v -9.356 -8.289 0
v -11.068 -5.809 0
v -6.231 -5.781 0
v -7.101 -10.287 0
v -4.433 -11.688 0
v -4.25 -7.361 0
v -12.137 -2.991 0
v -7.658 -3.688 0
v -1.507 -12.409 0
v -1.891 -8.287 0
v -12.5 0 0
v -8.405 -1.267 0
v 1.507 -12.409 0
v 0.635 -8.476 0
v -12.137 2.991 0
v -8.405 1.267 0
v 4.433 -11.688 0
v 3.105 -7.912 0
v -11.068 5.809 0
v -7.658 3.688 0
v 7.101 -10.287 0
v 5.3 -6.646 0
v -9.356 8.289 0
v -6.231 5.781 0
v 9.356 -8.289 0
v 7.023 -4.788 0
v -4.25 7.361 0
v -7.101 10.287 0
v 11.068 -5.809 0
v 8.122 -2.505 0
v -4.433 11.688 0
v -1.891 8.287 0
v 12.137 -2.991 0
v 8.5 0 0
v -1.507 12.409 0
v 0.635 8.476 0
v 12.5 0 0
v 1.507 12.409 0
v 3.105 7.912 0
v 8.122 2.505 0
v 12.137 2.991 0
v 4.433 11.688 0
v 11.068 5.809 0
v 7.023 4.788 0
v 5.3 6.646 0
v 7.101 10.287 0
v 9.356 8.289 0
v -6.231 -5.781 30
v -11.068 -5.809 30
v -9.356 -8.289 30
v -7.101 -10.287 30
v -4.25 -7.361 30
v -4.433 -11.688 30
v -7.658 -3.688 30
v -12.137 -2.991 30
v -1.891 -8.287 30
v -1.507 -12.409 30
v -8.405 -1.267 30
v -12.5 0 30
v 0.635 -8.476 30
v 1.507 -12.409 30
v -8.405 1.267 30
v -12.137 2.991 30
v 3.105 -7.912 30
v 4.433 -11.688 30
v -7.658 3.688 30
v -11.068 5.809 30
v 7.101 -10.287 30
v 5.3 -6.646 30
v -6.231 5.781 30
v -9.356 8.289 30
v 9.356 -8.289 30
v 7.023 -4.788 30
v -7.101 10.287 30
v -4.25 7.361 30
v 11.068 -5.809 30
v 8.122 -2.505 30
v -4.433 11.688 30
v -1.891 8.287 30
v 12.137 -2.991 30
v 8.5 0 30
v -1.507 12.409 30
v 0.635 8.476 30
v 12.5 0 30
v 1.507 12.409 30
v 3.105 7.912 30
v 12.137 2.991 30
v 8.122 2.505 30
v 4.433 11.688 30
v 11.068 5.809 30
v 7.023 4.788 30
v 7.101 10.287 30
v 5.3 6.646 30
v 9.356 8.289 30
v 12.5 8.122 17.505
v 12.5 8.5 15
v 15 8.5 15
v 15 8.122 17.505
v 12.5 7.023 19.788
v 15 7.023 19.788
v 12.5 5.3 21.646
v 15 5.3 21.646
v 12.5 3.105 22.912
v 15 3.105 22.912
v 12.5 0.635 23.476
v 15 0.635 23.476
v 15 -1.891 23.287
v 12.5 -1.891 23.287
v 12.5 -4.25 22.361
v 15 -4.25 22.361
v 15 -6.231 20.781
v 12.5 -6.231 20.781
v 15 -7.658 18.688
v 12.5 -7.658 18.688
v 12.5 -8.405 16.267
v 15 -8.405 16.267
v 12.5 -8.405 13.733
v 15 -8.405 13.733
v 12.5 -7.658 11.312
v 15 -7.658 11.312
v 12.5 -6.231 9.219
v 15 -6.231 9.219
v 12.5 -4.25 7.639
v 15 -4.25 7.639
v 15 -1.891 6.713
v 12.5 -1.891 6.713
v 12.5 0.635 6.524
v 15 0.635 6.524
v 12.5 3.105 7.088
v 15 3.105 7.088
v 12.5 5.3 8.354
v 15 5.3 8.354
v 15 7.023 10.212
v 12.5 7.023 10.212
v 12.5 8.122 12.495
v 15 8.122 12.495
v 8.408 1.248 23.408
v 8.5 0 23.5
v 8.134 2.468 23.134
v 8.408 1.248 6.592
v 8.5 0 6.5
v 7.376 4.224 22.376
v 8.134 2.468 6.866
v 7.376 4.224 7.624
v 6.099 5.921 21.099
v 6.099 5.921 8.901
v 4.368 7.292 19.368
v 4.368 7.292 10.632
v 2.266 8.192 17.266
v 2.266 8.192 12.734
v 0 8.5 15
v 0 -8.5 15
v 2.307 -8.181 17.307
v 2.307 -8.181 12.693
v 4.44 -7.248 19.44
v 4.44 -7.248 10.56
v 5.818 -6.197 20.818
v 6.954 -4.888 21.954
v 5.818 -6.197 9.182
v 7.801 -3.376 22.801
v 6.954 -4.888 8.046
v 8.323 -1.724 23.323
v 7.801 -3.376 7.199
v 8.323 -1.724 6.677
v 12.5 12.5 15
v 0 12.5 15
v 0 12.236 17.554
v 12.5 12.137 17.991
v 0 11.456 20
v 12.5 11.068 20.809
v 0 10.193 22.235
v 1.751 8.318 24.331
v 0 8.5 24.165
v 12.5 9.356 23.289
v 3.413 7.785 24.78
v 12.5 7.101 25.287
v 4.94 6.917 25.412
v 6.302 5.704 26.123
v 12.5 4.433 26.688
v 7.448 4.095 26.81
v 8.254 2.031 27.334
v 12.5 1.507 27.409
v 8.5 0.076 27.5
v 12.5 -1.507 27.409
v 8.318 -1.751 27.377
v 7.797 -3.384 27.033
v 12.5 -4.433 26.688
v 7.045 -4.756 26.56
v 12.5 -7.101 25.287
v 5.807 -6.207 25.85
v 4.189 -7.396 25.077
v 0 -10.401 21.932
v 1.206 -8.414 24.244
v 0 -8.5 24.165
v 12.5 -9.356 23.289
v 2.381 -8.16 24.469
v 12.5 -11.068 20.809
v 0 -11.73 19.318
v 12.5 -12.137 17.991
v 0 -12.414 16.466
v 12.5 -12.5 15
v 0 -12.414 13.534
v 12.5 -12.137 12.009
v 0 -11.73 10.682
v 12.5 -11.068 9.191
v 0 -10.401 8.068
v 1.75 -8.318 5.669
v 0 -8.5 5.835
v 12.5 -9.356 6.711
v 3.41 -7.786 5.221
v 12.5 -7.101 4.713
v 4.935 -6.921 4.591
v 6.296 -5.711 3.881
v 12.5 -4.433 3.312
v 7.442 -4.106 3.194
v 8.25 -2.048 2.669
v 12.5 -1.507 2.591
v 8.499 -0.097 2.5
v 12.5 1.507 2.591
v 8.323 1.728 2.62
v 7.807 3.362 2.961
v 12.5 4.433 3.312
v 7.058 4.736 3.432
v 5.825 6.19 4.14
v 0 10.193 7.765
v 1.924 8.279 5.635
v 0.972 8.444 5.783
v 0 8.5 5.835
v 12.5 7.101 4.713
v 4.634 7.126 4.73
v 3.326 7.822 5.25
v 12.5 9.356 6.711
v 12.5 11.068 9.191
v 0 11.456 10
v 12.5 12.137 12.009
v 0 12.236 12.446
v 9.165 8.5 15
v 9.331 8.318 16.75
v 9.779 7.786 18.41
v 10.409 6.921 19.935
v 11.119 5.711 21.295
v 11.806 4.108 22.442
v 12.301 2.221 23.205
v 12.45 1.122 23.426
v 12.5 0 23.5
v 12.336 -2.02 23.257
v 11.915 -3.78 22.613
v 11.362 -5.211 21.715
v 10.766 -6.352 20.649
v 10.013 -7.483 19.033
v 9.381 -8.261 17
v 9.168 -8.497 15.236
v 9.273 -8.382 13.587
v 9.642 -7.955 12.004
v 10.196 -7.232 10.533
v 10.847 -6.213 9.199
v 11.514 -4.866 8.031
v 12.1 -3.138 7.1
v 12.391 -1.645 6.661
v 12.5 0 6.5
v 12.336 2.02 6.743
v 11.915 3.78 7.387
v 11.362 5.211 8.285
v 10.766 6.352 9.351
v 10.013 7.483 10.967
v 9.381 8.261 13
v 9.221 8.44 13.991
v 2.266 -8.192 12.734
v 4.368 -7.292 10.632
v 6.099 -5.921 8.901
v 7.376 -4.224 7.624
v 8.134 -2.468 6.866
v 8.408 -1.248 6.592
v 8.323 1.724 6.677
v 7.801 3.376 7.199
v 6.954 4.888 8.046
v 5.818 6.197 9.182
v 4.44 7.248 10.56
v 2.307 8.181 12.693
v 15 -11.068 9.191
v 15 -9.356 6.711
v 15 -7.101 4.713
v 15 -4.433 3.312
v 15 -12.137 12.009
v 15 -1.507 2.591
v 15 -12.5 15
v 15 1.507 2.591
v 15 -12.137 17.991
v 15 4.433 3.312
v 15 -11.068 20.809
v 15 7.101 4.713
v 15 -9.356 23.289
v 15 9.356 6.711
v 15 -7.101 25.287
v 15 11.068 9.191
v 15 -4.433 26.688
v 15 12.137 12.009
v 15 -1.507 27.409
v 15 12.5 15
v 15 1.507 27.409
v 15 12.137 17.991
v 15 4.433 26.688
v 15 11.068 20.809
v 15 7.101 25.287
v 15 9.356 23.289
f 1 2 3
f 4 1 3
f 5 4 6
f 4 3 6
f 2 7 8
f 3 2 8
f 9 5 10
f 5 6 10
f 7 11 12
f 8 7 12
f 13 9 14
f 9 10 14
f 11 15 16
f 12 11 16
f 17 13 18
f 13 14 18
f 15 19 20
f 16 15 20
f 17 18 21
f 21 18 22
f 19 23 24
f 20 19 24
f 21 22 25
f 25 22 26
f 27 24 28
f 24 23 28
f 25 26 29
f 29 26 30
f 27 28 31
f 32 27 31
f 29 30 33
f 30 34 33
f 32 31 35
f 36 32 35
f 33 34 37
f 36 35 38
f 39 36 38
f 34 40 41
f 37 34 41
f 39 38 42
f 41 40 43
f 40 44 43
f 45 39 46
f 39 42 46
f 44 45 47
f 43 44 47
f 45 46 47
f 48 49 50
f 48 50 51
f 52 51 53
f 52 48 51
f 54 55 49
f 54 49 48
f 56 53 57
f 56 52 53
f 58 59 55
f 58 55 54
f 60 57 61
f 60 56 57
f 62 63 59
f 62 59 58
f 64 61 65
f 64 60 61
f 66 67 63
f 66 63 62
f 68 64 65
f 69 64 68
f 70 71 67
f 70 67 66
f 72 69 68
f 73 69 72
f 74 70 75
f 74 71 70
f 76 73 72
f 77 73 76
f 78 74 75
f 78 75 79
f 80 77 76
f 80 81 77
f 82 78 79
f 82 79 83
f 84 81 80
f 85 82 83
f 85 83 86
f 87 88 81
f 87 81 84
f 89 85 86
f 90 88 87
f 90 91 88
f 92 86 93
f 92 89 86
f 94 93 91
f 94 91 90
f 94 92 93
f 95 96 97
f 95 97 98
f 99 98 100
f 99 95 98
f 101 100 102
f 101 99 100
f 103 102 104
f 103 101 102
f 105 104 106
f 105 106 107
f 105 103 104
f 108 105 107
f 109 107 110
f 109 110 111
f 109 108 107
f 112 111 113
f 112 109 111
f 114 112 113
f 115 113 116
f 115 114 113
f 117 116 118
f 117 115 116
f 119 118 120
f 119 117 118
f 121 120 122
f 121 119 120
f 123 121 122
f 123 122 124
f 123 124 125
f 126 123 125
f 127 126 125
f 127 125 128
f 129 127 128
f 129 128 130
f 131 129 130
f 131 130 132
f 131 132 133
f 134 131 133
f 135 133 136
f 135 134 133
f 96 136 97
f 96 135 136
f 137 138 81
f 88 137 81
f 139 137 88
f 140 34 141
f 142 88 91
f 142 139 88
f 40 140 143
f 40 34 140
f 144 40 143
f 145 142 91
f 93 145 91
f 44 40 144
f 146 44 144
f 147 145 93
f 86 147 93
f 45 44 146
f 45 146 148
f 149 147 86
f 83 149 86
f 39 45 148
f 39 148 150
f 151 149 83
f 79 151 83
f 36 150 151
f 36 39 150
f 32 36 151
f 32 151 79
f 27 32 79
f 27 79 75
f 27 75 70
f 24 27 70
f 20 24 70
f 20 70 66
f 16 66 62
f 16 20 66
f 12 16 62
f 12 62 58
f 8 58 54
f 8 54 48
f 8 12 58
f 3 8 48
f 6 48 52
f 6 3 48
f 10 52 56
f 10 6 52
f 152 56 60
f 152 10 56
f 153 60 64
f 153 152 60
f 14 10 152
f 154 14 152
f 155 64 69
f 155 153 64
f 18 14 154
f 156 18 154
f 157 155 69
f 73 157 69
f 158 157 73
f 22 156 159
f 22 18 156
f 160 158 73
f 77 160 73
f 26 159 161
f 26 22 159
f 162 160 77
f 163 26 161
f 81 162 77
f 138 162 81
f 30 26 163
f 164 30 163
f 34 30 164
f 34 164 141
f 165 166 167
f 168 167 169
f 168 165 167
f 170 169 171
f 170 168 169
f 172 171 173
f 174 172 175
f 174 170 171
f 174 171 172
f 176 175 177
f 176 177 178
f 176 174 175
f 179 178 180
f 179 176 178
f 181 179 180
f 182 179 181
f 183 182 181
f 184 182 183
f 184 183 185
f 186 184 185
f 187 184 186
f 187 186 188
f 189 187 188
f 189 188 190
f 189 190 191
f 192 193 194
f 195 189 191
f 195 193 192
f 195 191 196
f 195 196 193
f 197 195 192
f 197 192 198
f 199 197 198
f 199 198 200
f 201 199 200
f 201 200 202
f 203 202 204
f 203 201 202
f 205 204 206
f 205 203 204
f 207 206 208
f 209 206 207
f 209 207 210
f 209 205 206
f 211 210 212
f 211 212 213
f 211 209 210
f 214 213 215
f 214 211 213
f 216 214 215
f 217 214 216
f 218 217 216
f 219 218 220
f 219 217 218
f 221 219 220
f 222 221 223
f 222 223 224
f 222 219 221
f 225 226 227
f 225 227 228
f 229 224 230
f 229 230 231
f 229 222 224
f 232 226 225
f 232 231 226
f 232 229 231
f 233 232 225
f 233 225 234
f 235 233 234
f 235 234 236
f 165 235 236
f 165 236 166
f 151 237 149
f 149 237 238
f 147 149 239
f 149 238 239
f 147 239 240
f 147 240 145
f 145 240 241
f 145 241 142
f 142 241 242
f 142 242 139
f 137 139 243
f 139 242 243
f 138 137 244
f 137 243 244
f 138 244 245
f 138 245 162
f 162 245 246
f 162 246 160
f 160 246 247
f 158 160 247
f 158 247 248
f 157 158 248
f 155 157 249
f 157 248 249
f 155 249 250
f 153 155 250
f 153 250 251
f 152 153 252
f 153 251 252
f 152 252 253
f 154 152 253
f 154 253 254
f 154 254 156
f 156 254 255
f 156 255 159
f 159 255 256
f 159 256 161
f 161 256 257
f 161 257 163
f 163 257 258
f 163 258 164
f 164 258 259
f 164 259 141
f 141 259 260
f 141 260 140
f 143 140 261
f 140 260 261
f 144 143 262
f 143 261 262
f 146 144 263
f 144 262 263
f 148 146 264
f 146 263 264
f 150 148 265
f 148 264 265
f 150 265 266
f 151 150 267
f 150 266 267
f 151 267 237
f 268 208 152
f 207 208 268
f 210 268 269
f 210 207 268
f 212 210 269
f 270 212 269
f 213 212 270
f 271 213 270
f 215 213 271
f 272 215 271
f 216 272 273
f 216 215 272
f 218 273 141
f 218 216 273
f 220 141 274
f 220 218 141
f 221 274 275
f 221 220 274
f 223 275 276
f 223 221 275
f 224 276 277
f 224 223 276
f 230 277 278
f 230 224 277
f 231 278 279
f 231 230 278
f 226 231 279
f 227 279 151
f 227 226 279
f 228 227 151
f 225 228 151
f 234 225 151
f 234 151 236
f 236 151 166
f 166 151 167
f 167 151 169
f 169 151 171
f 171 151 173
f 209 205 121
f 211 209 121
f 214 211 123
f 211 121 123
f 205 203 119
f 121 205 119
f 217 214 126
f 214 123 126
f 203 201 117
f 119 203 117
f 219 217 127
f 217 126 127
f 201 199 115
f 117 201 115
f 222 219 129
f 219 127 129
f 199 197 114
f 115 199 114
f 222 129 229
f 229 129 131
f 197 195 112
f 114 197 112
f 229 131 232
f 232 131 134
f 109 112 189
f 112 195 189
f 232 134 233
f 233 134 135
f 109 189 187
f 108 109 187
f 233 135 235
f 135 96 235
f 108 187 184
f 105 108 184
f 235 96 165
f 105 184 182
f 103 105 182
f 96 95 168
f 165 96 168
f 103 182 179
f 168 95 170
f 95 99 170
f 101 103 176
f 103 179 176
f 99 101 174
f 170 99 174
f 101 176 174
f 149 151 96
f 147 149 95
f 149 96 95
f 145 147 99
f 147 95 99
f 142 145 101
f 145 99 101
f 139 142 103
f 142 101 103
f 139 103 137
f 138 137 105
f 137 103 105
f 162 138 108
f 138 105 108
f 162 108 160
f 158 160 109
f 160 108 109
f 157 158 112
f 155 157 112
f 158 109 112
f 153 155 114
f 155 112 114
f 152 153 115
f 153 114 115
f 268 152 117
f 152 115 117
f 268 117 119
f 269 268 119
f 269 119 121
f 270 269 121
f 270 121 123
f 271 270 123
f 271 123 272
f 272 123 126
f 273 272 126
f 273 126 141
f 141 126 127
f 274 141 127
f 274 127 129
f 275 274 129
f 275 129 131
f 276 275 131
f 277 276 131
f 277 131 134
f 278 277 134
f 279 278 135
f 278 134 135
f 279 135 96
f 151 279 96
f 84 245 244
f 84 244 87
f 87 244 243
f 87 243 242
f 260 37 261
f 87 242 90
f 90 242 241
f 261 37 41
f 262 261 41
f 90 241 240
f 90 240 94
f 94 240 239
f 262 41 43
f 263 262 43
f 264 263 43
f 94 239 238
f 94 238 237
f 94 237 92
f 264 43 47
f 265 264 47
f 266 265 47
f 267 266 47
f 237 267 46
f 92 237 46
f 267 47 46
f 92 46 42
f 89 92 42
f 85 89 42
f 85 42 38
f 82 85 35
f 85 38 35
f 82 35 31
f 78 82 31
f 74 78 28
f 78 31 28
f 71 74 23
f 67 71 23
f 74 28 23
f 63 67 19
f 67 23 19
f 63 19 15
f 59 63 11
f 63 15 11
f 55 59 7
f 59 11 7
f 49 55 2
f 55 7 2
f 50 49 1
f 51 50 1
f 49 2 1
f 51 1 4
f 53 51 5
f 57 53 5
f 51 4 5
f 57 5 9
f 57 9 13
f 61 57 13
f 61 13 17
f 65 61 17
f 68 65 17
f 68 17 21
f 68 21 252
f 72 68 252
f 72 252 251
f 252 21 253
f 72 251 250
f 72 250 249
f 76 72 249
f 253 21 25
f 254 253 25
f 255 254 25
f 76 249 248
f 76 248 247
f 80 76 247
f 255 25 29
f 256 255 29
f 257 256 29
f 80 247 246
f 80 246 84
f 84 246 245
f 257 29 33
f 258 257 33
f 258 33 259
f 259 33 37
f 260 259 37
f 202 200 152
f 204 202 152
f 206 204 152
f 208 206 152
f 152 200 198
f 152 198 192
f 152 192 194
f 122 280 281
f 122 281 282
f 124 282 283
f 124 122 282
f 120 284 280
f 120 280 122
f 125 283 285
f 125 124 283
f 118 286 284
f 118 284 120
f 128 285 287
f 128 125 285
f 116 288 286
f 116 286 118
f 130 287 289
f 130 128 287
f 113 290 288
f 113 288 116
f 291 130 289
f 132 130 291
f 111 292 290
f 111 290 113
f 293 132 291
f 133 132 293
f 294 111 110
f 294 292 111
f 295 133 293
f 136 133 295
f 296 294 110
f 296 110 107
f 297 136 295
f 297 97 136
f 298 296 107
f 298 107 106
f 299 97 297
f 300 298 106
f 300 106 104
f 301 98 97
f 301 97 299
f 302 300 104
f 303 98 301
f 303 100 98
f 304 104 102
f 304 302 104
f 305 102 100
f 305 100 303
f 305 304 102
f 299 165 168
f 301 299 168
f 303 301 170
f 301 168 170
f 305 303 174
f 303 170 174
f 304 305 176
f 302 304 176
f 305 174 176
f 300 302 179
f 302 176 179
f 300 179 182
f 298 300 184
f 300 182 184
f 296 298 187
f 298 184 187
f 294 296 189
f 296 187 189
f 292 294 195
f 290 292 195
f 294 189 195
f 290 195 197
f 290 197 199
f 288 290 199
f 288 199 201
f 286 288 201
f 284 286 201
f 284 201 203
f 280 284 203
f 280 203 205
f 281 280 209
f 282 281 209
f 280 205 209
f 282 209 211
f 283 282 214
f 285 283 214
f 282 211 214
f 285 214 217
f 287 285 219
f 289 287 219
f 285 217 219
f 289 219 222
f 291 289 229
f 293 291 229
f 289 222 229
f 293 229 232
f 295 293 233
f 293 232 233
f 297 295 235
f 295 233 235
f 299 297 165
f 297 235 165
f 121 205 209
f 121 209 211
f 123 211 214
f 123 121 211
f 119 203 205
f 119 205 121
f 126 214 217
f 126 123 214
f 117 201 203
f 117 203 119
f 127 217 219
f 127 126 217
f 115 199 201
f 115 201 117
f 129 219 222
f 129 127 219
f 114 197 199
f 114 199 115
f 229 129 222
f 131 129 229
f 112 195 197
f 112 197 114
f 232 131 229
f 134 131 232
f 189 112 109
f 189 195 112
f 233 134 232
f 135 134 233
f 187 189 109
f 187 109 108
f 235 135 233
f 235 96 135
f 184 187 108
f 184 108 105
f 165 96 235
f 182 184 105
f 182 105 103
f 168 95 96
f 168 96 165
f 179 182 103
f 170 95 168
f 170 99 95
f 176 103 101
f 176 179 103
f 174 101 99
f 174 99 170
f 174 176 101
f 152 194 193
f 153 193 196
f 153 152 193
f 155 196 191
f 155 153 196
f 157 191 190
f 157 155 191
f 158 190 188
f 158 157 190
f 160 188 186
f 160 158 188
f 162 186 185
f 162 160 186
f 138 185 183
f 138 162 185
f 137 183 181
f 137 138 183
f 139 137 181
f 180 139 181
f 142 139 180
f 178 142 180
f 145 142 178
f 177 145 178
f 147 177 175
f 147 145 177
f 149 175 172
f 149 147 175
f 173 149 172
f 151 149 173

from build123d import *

# Parameters (mm, degrees)
F0_R     = 12.5
F0_R_2   = 8.5
F1_DEPTH = 30
F4_R     = 12.5
F4_R_2   = 8.5
F5_DEPTH = 12.5
F6_DEPTH = 12.5
F7_DEPTH = 30
F8_DEPTH = 2.5


with BuildPart() as f1:
    # F0 (on Top) → F1 (new body)
    with BuildSketch(Plane.XY):
        Circle(F0_R)
        Circle(F0_R_2, mode=Mode.SUBTRACT)
    extrude(amount=F1_DEPTH)

    # F4 (on face) → F6 (cut)
    with BuildSketch(Plane.YZ.offset(12.5)):
        with Locations((0, 15)):
            Circle(F4_R_2)
    extrude(amount=-F6_DEPTH, mode=Mode.SUBTRACT)


with BuildPart() as f5:
    # F4 (on face) → F5 (new body)
    with BuildSketch(Plane.YZ.offset(12.5)):
        with Locations((0, 15)):
            Circle(F4_R)
        with Locations((0, 15)):
            Circle(F4_R_2, mode=Mode.SUBTRACT)
    extrude(amount=-F5_DEPTH)

    # F0 (on Top) → F7 (cut)
    with BuildSketch(Plane.XY):
        Circle(F0_R_2)
    extrude(amount=F7_DEPTH, mode=Mode.SUBTRACT)


with BuildPart() as f8:
    # F4 (on face) → F8 (new body)
    with BuildSketch(Plane.YZ.offset(12.5)):
        with Locations((0, 15)):
            Circle(F4_R)
        with Locations((0, 15)):
            Circle(F4_R_2, mode=Mode.SUBTRACT)
    extrude(amount=F8_DEPTH)


solid = Compound([f1.part, f5.part, f8.part])
